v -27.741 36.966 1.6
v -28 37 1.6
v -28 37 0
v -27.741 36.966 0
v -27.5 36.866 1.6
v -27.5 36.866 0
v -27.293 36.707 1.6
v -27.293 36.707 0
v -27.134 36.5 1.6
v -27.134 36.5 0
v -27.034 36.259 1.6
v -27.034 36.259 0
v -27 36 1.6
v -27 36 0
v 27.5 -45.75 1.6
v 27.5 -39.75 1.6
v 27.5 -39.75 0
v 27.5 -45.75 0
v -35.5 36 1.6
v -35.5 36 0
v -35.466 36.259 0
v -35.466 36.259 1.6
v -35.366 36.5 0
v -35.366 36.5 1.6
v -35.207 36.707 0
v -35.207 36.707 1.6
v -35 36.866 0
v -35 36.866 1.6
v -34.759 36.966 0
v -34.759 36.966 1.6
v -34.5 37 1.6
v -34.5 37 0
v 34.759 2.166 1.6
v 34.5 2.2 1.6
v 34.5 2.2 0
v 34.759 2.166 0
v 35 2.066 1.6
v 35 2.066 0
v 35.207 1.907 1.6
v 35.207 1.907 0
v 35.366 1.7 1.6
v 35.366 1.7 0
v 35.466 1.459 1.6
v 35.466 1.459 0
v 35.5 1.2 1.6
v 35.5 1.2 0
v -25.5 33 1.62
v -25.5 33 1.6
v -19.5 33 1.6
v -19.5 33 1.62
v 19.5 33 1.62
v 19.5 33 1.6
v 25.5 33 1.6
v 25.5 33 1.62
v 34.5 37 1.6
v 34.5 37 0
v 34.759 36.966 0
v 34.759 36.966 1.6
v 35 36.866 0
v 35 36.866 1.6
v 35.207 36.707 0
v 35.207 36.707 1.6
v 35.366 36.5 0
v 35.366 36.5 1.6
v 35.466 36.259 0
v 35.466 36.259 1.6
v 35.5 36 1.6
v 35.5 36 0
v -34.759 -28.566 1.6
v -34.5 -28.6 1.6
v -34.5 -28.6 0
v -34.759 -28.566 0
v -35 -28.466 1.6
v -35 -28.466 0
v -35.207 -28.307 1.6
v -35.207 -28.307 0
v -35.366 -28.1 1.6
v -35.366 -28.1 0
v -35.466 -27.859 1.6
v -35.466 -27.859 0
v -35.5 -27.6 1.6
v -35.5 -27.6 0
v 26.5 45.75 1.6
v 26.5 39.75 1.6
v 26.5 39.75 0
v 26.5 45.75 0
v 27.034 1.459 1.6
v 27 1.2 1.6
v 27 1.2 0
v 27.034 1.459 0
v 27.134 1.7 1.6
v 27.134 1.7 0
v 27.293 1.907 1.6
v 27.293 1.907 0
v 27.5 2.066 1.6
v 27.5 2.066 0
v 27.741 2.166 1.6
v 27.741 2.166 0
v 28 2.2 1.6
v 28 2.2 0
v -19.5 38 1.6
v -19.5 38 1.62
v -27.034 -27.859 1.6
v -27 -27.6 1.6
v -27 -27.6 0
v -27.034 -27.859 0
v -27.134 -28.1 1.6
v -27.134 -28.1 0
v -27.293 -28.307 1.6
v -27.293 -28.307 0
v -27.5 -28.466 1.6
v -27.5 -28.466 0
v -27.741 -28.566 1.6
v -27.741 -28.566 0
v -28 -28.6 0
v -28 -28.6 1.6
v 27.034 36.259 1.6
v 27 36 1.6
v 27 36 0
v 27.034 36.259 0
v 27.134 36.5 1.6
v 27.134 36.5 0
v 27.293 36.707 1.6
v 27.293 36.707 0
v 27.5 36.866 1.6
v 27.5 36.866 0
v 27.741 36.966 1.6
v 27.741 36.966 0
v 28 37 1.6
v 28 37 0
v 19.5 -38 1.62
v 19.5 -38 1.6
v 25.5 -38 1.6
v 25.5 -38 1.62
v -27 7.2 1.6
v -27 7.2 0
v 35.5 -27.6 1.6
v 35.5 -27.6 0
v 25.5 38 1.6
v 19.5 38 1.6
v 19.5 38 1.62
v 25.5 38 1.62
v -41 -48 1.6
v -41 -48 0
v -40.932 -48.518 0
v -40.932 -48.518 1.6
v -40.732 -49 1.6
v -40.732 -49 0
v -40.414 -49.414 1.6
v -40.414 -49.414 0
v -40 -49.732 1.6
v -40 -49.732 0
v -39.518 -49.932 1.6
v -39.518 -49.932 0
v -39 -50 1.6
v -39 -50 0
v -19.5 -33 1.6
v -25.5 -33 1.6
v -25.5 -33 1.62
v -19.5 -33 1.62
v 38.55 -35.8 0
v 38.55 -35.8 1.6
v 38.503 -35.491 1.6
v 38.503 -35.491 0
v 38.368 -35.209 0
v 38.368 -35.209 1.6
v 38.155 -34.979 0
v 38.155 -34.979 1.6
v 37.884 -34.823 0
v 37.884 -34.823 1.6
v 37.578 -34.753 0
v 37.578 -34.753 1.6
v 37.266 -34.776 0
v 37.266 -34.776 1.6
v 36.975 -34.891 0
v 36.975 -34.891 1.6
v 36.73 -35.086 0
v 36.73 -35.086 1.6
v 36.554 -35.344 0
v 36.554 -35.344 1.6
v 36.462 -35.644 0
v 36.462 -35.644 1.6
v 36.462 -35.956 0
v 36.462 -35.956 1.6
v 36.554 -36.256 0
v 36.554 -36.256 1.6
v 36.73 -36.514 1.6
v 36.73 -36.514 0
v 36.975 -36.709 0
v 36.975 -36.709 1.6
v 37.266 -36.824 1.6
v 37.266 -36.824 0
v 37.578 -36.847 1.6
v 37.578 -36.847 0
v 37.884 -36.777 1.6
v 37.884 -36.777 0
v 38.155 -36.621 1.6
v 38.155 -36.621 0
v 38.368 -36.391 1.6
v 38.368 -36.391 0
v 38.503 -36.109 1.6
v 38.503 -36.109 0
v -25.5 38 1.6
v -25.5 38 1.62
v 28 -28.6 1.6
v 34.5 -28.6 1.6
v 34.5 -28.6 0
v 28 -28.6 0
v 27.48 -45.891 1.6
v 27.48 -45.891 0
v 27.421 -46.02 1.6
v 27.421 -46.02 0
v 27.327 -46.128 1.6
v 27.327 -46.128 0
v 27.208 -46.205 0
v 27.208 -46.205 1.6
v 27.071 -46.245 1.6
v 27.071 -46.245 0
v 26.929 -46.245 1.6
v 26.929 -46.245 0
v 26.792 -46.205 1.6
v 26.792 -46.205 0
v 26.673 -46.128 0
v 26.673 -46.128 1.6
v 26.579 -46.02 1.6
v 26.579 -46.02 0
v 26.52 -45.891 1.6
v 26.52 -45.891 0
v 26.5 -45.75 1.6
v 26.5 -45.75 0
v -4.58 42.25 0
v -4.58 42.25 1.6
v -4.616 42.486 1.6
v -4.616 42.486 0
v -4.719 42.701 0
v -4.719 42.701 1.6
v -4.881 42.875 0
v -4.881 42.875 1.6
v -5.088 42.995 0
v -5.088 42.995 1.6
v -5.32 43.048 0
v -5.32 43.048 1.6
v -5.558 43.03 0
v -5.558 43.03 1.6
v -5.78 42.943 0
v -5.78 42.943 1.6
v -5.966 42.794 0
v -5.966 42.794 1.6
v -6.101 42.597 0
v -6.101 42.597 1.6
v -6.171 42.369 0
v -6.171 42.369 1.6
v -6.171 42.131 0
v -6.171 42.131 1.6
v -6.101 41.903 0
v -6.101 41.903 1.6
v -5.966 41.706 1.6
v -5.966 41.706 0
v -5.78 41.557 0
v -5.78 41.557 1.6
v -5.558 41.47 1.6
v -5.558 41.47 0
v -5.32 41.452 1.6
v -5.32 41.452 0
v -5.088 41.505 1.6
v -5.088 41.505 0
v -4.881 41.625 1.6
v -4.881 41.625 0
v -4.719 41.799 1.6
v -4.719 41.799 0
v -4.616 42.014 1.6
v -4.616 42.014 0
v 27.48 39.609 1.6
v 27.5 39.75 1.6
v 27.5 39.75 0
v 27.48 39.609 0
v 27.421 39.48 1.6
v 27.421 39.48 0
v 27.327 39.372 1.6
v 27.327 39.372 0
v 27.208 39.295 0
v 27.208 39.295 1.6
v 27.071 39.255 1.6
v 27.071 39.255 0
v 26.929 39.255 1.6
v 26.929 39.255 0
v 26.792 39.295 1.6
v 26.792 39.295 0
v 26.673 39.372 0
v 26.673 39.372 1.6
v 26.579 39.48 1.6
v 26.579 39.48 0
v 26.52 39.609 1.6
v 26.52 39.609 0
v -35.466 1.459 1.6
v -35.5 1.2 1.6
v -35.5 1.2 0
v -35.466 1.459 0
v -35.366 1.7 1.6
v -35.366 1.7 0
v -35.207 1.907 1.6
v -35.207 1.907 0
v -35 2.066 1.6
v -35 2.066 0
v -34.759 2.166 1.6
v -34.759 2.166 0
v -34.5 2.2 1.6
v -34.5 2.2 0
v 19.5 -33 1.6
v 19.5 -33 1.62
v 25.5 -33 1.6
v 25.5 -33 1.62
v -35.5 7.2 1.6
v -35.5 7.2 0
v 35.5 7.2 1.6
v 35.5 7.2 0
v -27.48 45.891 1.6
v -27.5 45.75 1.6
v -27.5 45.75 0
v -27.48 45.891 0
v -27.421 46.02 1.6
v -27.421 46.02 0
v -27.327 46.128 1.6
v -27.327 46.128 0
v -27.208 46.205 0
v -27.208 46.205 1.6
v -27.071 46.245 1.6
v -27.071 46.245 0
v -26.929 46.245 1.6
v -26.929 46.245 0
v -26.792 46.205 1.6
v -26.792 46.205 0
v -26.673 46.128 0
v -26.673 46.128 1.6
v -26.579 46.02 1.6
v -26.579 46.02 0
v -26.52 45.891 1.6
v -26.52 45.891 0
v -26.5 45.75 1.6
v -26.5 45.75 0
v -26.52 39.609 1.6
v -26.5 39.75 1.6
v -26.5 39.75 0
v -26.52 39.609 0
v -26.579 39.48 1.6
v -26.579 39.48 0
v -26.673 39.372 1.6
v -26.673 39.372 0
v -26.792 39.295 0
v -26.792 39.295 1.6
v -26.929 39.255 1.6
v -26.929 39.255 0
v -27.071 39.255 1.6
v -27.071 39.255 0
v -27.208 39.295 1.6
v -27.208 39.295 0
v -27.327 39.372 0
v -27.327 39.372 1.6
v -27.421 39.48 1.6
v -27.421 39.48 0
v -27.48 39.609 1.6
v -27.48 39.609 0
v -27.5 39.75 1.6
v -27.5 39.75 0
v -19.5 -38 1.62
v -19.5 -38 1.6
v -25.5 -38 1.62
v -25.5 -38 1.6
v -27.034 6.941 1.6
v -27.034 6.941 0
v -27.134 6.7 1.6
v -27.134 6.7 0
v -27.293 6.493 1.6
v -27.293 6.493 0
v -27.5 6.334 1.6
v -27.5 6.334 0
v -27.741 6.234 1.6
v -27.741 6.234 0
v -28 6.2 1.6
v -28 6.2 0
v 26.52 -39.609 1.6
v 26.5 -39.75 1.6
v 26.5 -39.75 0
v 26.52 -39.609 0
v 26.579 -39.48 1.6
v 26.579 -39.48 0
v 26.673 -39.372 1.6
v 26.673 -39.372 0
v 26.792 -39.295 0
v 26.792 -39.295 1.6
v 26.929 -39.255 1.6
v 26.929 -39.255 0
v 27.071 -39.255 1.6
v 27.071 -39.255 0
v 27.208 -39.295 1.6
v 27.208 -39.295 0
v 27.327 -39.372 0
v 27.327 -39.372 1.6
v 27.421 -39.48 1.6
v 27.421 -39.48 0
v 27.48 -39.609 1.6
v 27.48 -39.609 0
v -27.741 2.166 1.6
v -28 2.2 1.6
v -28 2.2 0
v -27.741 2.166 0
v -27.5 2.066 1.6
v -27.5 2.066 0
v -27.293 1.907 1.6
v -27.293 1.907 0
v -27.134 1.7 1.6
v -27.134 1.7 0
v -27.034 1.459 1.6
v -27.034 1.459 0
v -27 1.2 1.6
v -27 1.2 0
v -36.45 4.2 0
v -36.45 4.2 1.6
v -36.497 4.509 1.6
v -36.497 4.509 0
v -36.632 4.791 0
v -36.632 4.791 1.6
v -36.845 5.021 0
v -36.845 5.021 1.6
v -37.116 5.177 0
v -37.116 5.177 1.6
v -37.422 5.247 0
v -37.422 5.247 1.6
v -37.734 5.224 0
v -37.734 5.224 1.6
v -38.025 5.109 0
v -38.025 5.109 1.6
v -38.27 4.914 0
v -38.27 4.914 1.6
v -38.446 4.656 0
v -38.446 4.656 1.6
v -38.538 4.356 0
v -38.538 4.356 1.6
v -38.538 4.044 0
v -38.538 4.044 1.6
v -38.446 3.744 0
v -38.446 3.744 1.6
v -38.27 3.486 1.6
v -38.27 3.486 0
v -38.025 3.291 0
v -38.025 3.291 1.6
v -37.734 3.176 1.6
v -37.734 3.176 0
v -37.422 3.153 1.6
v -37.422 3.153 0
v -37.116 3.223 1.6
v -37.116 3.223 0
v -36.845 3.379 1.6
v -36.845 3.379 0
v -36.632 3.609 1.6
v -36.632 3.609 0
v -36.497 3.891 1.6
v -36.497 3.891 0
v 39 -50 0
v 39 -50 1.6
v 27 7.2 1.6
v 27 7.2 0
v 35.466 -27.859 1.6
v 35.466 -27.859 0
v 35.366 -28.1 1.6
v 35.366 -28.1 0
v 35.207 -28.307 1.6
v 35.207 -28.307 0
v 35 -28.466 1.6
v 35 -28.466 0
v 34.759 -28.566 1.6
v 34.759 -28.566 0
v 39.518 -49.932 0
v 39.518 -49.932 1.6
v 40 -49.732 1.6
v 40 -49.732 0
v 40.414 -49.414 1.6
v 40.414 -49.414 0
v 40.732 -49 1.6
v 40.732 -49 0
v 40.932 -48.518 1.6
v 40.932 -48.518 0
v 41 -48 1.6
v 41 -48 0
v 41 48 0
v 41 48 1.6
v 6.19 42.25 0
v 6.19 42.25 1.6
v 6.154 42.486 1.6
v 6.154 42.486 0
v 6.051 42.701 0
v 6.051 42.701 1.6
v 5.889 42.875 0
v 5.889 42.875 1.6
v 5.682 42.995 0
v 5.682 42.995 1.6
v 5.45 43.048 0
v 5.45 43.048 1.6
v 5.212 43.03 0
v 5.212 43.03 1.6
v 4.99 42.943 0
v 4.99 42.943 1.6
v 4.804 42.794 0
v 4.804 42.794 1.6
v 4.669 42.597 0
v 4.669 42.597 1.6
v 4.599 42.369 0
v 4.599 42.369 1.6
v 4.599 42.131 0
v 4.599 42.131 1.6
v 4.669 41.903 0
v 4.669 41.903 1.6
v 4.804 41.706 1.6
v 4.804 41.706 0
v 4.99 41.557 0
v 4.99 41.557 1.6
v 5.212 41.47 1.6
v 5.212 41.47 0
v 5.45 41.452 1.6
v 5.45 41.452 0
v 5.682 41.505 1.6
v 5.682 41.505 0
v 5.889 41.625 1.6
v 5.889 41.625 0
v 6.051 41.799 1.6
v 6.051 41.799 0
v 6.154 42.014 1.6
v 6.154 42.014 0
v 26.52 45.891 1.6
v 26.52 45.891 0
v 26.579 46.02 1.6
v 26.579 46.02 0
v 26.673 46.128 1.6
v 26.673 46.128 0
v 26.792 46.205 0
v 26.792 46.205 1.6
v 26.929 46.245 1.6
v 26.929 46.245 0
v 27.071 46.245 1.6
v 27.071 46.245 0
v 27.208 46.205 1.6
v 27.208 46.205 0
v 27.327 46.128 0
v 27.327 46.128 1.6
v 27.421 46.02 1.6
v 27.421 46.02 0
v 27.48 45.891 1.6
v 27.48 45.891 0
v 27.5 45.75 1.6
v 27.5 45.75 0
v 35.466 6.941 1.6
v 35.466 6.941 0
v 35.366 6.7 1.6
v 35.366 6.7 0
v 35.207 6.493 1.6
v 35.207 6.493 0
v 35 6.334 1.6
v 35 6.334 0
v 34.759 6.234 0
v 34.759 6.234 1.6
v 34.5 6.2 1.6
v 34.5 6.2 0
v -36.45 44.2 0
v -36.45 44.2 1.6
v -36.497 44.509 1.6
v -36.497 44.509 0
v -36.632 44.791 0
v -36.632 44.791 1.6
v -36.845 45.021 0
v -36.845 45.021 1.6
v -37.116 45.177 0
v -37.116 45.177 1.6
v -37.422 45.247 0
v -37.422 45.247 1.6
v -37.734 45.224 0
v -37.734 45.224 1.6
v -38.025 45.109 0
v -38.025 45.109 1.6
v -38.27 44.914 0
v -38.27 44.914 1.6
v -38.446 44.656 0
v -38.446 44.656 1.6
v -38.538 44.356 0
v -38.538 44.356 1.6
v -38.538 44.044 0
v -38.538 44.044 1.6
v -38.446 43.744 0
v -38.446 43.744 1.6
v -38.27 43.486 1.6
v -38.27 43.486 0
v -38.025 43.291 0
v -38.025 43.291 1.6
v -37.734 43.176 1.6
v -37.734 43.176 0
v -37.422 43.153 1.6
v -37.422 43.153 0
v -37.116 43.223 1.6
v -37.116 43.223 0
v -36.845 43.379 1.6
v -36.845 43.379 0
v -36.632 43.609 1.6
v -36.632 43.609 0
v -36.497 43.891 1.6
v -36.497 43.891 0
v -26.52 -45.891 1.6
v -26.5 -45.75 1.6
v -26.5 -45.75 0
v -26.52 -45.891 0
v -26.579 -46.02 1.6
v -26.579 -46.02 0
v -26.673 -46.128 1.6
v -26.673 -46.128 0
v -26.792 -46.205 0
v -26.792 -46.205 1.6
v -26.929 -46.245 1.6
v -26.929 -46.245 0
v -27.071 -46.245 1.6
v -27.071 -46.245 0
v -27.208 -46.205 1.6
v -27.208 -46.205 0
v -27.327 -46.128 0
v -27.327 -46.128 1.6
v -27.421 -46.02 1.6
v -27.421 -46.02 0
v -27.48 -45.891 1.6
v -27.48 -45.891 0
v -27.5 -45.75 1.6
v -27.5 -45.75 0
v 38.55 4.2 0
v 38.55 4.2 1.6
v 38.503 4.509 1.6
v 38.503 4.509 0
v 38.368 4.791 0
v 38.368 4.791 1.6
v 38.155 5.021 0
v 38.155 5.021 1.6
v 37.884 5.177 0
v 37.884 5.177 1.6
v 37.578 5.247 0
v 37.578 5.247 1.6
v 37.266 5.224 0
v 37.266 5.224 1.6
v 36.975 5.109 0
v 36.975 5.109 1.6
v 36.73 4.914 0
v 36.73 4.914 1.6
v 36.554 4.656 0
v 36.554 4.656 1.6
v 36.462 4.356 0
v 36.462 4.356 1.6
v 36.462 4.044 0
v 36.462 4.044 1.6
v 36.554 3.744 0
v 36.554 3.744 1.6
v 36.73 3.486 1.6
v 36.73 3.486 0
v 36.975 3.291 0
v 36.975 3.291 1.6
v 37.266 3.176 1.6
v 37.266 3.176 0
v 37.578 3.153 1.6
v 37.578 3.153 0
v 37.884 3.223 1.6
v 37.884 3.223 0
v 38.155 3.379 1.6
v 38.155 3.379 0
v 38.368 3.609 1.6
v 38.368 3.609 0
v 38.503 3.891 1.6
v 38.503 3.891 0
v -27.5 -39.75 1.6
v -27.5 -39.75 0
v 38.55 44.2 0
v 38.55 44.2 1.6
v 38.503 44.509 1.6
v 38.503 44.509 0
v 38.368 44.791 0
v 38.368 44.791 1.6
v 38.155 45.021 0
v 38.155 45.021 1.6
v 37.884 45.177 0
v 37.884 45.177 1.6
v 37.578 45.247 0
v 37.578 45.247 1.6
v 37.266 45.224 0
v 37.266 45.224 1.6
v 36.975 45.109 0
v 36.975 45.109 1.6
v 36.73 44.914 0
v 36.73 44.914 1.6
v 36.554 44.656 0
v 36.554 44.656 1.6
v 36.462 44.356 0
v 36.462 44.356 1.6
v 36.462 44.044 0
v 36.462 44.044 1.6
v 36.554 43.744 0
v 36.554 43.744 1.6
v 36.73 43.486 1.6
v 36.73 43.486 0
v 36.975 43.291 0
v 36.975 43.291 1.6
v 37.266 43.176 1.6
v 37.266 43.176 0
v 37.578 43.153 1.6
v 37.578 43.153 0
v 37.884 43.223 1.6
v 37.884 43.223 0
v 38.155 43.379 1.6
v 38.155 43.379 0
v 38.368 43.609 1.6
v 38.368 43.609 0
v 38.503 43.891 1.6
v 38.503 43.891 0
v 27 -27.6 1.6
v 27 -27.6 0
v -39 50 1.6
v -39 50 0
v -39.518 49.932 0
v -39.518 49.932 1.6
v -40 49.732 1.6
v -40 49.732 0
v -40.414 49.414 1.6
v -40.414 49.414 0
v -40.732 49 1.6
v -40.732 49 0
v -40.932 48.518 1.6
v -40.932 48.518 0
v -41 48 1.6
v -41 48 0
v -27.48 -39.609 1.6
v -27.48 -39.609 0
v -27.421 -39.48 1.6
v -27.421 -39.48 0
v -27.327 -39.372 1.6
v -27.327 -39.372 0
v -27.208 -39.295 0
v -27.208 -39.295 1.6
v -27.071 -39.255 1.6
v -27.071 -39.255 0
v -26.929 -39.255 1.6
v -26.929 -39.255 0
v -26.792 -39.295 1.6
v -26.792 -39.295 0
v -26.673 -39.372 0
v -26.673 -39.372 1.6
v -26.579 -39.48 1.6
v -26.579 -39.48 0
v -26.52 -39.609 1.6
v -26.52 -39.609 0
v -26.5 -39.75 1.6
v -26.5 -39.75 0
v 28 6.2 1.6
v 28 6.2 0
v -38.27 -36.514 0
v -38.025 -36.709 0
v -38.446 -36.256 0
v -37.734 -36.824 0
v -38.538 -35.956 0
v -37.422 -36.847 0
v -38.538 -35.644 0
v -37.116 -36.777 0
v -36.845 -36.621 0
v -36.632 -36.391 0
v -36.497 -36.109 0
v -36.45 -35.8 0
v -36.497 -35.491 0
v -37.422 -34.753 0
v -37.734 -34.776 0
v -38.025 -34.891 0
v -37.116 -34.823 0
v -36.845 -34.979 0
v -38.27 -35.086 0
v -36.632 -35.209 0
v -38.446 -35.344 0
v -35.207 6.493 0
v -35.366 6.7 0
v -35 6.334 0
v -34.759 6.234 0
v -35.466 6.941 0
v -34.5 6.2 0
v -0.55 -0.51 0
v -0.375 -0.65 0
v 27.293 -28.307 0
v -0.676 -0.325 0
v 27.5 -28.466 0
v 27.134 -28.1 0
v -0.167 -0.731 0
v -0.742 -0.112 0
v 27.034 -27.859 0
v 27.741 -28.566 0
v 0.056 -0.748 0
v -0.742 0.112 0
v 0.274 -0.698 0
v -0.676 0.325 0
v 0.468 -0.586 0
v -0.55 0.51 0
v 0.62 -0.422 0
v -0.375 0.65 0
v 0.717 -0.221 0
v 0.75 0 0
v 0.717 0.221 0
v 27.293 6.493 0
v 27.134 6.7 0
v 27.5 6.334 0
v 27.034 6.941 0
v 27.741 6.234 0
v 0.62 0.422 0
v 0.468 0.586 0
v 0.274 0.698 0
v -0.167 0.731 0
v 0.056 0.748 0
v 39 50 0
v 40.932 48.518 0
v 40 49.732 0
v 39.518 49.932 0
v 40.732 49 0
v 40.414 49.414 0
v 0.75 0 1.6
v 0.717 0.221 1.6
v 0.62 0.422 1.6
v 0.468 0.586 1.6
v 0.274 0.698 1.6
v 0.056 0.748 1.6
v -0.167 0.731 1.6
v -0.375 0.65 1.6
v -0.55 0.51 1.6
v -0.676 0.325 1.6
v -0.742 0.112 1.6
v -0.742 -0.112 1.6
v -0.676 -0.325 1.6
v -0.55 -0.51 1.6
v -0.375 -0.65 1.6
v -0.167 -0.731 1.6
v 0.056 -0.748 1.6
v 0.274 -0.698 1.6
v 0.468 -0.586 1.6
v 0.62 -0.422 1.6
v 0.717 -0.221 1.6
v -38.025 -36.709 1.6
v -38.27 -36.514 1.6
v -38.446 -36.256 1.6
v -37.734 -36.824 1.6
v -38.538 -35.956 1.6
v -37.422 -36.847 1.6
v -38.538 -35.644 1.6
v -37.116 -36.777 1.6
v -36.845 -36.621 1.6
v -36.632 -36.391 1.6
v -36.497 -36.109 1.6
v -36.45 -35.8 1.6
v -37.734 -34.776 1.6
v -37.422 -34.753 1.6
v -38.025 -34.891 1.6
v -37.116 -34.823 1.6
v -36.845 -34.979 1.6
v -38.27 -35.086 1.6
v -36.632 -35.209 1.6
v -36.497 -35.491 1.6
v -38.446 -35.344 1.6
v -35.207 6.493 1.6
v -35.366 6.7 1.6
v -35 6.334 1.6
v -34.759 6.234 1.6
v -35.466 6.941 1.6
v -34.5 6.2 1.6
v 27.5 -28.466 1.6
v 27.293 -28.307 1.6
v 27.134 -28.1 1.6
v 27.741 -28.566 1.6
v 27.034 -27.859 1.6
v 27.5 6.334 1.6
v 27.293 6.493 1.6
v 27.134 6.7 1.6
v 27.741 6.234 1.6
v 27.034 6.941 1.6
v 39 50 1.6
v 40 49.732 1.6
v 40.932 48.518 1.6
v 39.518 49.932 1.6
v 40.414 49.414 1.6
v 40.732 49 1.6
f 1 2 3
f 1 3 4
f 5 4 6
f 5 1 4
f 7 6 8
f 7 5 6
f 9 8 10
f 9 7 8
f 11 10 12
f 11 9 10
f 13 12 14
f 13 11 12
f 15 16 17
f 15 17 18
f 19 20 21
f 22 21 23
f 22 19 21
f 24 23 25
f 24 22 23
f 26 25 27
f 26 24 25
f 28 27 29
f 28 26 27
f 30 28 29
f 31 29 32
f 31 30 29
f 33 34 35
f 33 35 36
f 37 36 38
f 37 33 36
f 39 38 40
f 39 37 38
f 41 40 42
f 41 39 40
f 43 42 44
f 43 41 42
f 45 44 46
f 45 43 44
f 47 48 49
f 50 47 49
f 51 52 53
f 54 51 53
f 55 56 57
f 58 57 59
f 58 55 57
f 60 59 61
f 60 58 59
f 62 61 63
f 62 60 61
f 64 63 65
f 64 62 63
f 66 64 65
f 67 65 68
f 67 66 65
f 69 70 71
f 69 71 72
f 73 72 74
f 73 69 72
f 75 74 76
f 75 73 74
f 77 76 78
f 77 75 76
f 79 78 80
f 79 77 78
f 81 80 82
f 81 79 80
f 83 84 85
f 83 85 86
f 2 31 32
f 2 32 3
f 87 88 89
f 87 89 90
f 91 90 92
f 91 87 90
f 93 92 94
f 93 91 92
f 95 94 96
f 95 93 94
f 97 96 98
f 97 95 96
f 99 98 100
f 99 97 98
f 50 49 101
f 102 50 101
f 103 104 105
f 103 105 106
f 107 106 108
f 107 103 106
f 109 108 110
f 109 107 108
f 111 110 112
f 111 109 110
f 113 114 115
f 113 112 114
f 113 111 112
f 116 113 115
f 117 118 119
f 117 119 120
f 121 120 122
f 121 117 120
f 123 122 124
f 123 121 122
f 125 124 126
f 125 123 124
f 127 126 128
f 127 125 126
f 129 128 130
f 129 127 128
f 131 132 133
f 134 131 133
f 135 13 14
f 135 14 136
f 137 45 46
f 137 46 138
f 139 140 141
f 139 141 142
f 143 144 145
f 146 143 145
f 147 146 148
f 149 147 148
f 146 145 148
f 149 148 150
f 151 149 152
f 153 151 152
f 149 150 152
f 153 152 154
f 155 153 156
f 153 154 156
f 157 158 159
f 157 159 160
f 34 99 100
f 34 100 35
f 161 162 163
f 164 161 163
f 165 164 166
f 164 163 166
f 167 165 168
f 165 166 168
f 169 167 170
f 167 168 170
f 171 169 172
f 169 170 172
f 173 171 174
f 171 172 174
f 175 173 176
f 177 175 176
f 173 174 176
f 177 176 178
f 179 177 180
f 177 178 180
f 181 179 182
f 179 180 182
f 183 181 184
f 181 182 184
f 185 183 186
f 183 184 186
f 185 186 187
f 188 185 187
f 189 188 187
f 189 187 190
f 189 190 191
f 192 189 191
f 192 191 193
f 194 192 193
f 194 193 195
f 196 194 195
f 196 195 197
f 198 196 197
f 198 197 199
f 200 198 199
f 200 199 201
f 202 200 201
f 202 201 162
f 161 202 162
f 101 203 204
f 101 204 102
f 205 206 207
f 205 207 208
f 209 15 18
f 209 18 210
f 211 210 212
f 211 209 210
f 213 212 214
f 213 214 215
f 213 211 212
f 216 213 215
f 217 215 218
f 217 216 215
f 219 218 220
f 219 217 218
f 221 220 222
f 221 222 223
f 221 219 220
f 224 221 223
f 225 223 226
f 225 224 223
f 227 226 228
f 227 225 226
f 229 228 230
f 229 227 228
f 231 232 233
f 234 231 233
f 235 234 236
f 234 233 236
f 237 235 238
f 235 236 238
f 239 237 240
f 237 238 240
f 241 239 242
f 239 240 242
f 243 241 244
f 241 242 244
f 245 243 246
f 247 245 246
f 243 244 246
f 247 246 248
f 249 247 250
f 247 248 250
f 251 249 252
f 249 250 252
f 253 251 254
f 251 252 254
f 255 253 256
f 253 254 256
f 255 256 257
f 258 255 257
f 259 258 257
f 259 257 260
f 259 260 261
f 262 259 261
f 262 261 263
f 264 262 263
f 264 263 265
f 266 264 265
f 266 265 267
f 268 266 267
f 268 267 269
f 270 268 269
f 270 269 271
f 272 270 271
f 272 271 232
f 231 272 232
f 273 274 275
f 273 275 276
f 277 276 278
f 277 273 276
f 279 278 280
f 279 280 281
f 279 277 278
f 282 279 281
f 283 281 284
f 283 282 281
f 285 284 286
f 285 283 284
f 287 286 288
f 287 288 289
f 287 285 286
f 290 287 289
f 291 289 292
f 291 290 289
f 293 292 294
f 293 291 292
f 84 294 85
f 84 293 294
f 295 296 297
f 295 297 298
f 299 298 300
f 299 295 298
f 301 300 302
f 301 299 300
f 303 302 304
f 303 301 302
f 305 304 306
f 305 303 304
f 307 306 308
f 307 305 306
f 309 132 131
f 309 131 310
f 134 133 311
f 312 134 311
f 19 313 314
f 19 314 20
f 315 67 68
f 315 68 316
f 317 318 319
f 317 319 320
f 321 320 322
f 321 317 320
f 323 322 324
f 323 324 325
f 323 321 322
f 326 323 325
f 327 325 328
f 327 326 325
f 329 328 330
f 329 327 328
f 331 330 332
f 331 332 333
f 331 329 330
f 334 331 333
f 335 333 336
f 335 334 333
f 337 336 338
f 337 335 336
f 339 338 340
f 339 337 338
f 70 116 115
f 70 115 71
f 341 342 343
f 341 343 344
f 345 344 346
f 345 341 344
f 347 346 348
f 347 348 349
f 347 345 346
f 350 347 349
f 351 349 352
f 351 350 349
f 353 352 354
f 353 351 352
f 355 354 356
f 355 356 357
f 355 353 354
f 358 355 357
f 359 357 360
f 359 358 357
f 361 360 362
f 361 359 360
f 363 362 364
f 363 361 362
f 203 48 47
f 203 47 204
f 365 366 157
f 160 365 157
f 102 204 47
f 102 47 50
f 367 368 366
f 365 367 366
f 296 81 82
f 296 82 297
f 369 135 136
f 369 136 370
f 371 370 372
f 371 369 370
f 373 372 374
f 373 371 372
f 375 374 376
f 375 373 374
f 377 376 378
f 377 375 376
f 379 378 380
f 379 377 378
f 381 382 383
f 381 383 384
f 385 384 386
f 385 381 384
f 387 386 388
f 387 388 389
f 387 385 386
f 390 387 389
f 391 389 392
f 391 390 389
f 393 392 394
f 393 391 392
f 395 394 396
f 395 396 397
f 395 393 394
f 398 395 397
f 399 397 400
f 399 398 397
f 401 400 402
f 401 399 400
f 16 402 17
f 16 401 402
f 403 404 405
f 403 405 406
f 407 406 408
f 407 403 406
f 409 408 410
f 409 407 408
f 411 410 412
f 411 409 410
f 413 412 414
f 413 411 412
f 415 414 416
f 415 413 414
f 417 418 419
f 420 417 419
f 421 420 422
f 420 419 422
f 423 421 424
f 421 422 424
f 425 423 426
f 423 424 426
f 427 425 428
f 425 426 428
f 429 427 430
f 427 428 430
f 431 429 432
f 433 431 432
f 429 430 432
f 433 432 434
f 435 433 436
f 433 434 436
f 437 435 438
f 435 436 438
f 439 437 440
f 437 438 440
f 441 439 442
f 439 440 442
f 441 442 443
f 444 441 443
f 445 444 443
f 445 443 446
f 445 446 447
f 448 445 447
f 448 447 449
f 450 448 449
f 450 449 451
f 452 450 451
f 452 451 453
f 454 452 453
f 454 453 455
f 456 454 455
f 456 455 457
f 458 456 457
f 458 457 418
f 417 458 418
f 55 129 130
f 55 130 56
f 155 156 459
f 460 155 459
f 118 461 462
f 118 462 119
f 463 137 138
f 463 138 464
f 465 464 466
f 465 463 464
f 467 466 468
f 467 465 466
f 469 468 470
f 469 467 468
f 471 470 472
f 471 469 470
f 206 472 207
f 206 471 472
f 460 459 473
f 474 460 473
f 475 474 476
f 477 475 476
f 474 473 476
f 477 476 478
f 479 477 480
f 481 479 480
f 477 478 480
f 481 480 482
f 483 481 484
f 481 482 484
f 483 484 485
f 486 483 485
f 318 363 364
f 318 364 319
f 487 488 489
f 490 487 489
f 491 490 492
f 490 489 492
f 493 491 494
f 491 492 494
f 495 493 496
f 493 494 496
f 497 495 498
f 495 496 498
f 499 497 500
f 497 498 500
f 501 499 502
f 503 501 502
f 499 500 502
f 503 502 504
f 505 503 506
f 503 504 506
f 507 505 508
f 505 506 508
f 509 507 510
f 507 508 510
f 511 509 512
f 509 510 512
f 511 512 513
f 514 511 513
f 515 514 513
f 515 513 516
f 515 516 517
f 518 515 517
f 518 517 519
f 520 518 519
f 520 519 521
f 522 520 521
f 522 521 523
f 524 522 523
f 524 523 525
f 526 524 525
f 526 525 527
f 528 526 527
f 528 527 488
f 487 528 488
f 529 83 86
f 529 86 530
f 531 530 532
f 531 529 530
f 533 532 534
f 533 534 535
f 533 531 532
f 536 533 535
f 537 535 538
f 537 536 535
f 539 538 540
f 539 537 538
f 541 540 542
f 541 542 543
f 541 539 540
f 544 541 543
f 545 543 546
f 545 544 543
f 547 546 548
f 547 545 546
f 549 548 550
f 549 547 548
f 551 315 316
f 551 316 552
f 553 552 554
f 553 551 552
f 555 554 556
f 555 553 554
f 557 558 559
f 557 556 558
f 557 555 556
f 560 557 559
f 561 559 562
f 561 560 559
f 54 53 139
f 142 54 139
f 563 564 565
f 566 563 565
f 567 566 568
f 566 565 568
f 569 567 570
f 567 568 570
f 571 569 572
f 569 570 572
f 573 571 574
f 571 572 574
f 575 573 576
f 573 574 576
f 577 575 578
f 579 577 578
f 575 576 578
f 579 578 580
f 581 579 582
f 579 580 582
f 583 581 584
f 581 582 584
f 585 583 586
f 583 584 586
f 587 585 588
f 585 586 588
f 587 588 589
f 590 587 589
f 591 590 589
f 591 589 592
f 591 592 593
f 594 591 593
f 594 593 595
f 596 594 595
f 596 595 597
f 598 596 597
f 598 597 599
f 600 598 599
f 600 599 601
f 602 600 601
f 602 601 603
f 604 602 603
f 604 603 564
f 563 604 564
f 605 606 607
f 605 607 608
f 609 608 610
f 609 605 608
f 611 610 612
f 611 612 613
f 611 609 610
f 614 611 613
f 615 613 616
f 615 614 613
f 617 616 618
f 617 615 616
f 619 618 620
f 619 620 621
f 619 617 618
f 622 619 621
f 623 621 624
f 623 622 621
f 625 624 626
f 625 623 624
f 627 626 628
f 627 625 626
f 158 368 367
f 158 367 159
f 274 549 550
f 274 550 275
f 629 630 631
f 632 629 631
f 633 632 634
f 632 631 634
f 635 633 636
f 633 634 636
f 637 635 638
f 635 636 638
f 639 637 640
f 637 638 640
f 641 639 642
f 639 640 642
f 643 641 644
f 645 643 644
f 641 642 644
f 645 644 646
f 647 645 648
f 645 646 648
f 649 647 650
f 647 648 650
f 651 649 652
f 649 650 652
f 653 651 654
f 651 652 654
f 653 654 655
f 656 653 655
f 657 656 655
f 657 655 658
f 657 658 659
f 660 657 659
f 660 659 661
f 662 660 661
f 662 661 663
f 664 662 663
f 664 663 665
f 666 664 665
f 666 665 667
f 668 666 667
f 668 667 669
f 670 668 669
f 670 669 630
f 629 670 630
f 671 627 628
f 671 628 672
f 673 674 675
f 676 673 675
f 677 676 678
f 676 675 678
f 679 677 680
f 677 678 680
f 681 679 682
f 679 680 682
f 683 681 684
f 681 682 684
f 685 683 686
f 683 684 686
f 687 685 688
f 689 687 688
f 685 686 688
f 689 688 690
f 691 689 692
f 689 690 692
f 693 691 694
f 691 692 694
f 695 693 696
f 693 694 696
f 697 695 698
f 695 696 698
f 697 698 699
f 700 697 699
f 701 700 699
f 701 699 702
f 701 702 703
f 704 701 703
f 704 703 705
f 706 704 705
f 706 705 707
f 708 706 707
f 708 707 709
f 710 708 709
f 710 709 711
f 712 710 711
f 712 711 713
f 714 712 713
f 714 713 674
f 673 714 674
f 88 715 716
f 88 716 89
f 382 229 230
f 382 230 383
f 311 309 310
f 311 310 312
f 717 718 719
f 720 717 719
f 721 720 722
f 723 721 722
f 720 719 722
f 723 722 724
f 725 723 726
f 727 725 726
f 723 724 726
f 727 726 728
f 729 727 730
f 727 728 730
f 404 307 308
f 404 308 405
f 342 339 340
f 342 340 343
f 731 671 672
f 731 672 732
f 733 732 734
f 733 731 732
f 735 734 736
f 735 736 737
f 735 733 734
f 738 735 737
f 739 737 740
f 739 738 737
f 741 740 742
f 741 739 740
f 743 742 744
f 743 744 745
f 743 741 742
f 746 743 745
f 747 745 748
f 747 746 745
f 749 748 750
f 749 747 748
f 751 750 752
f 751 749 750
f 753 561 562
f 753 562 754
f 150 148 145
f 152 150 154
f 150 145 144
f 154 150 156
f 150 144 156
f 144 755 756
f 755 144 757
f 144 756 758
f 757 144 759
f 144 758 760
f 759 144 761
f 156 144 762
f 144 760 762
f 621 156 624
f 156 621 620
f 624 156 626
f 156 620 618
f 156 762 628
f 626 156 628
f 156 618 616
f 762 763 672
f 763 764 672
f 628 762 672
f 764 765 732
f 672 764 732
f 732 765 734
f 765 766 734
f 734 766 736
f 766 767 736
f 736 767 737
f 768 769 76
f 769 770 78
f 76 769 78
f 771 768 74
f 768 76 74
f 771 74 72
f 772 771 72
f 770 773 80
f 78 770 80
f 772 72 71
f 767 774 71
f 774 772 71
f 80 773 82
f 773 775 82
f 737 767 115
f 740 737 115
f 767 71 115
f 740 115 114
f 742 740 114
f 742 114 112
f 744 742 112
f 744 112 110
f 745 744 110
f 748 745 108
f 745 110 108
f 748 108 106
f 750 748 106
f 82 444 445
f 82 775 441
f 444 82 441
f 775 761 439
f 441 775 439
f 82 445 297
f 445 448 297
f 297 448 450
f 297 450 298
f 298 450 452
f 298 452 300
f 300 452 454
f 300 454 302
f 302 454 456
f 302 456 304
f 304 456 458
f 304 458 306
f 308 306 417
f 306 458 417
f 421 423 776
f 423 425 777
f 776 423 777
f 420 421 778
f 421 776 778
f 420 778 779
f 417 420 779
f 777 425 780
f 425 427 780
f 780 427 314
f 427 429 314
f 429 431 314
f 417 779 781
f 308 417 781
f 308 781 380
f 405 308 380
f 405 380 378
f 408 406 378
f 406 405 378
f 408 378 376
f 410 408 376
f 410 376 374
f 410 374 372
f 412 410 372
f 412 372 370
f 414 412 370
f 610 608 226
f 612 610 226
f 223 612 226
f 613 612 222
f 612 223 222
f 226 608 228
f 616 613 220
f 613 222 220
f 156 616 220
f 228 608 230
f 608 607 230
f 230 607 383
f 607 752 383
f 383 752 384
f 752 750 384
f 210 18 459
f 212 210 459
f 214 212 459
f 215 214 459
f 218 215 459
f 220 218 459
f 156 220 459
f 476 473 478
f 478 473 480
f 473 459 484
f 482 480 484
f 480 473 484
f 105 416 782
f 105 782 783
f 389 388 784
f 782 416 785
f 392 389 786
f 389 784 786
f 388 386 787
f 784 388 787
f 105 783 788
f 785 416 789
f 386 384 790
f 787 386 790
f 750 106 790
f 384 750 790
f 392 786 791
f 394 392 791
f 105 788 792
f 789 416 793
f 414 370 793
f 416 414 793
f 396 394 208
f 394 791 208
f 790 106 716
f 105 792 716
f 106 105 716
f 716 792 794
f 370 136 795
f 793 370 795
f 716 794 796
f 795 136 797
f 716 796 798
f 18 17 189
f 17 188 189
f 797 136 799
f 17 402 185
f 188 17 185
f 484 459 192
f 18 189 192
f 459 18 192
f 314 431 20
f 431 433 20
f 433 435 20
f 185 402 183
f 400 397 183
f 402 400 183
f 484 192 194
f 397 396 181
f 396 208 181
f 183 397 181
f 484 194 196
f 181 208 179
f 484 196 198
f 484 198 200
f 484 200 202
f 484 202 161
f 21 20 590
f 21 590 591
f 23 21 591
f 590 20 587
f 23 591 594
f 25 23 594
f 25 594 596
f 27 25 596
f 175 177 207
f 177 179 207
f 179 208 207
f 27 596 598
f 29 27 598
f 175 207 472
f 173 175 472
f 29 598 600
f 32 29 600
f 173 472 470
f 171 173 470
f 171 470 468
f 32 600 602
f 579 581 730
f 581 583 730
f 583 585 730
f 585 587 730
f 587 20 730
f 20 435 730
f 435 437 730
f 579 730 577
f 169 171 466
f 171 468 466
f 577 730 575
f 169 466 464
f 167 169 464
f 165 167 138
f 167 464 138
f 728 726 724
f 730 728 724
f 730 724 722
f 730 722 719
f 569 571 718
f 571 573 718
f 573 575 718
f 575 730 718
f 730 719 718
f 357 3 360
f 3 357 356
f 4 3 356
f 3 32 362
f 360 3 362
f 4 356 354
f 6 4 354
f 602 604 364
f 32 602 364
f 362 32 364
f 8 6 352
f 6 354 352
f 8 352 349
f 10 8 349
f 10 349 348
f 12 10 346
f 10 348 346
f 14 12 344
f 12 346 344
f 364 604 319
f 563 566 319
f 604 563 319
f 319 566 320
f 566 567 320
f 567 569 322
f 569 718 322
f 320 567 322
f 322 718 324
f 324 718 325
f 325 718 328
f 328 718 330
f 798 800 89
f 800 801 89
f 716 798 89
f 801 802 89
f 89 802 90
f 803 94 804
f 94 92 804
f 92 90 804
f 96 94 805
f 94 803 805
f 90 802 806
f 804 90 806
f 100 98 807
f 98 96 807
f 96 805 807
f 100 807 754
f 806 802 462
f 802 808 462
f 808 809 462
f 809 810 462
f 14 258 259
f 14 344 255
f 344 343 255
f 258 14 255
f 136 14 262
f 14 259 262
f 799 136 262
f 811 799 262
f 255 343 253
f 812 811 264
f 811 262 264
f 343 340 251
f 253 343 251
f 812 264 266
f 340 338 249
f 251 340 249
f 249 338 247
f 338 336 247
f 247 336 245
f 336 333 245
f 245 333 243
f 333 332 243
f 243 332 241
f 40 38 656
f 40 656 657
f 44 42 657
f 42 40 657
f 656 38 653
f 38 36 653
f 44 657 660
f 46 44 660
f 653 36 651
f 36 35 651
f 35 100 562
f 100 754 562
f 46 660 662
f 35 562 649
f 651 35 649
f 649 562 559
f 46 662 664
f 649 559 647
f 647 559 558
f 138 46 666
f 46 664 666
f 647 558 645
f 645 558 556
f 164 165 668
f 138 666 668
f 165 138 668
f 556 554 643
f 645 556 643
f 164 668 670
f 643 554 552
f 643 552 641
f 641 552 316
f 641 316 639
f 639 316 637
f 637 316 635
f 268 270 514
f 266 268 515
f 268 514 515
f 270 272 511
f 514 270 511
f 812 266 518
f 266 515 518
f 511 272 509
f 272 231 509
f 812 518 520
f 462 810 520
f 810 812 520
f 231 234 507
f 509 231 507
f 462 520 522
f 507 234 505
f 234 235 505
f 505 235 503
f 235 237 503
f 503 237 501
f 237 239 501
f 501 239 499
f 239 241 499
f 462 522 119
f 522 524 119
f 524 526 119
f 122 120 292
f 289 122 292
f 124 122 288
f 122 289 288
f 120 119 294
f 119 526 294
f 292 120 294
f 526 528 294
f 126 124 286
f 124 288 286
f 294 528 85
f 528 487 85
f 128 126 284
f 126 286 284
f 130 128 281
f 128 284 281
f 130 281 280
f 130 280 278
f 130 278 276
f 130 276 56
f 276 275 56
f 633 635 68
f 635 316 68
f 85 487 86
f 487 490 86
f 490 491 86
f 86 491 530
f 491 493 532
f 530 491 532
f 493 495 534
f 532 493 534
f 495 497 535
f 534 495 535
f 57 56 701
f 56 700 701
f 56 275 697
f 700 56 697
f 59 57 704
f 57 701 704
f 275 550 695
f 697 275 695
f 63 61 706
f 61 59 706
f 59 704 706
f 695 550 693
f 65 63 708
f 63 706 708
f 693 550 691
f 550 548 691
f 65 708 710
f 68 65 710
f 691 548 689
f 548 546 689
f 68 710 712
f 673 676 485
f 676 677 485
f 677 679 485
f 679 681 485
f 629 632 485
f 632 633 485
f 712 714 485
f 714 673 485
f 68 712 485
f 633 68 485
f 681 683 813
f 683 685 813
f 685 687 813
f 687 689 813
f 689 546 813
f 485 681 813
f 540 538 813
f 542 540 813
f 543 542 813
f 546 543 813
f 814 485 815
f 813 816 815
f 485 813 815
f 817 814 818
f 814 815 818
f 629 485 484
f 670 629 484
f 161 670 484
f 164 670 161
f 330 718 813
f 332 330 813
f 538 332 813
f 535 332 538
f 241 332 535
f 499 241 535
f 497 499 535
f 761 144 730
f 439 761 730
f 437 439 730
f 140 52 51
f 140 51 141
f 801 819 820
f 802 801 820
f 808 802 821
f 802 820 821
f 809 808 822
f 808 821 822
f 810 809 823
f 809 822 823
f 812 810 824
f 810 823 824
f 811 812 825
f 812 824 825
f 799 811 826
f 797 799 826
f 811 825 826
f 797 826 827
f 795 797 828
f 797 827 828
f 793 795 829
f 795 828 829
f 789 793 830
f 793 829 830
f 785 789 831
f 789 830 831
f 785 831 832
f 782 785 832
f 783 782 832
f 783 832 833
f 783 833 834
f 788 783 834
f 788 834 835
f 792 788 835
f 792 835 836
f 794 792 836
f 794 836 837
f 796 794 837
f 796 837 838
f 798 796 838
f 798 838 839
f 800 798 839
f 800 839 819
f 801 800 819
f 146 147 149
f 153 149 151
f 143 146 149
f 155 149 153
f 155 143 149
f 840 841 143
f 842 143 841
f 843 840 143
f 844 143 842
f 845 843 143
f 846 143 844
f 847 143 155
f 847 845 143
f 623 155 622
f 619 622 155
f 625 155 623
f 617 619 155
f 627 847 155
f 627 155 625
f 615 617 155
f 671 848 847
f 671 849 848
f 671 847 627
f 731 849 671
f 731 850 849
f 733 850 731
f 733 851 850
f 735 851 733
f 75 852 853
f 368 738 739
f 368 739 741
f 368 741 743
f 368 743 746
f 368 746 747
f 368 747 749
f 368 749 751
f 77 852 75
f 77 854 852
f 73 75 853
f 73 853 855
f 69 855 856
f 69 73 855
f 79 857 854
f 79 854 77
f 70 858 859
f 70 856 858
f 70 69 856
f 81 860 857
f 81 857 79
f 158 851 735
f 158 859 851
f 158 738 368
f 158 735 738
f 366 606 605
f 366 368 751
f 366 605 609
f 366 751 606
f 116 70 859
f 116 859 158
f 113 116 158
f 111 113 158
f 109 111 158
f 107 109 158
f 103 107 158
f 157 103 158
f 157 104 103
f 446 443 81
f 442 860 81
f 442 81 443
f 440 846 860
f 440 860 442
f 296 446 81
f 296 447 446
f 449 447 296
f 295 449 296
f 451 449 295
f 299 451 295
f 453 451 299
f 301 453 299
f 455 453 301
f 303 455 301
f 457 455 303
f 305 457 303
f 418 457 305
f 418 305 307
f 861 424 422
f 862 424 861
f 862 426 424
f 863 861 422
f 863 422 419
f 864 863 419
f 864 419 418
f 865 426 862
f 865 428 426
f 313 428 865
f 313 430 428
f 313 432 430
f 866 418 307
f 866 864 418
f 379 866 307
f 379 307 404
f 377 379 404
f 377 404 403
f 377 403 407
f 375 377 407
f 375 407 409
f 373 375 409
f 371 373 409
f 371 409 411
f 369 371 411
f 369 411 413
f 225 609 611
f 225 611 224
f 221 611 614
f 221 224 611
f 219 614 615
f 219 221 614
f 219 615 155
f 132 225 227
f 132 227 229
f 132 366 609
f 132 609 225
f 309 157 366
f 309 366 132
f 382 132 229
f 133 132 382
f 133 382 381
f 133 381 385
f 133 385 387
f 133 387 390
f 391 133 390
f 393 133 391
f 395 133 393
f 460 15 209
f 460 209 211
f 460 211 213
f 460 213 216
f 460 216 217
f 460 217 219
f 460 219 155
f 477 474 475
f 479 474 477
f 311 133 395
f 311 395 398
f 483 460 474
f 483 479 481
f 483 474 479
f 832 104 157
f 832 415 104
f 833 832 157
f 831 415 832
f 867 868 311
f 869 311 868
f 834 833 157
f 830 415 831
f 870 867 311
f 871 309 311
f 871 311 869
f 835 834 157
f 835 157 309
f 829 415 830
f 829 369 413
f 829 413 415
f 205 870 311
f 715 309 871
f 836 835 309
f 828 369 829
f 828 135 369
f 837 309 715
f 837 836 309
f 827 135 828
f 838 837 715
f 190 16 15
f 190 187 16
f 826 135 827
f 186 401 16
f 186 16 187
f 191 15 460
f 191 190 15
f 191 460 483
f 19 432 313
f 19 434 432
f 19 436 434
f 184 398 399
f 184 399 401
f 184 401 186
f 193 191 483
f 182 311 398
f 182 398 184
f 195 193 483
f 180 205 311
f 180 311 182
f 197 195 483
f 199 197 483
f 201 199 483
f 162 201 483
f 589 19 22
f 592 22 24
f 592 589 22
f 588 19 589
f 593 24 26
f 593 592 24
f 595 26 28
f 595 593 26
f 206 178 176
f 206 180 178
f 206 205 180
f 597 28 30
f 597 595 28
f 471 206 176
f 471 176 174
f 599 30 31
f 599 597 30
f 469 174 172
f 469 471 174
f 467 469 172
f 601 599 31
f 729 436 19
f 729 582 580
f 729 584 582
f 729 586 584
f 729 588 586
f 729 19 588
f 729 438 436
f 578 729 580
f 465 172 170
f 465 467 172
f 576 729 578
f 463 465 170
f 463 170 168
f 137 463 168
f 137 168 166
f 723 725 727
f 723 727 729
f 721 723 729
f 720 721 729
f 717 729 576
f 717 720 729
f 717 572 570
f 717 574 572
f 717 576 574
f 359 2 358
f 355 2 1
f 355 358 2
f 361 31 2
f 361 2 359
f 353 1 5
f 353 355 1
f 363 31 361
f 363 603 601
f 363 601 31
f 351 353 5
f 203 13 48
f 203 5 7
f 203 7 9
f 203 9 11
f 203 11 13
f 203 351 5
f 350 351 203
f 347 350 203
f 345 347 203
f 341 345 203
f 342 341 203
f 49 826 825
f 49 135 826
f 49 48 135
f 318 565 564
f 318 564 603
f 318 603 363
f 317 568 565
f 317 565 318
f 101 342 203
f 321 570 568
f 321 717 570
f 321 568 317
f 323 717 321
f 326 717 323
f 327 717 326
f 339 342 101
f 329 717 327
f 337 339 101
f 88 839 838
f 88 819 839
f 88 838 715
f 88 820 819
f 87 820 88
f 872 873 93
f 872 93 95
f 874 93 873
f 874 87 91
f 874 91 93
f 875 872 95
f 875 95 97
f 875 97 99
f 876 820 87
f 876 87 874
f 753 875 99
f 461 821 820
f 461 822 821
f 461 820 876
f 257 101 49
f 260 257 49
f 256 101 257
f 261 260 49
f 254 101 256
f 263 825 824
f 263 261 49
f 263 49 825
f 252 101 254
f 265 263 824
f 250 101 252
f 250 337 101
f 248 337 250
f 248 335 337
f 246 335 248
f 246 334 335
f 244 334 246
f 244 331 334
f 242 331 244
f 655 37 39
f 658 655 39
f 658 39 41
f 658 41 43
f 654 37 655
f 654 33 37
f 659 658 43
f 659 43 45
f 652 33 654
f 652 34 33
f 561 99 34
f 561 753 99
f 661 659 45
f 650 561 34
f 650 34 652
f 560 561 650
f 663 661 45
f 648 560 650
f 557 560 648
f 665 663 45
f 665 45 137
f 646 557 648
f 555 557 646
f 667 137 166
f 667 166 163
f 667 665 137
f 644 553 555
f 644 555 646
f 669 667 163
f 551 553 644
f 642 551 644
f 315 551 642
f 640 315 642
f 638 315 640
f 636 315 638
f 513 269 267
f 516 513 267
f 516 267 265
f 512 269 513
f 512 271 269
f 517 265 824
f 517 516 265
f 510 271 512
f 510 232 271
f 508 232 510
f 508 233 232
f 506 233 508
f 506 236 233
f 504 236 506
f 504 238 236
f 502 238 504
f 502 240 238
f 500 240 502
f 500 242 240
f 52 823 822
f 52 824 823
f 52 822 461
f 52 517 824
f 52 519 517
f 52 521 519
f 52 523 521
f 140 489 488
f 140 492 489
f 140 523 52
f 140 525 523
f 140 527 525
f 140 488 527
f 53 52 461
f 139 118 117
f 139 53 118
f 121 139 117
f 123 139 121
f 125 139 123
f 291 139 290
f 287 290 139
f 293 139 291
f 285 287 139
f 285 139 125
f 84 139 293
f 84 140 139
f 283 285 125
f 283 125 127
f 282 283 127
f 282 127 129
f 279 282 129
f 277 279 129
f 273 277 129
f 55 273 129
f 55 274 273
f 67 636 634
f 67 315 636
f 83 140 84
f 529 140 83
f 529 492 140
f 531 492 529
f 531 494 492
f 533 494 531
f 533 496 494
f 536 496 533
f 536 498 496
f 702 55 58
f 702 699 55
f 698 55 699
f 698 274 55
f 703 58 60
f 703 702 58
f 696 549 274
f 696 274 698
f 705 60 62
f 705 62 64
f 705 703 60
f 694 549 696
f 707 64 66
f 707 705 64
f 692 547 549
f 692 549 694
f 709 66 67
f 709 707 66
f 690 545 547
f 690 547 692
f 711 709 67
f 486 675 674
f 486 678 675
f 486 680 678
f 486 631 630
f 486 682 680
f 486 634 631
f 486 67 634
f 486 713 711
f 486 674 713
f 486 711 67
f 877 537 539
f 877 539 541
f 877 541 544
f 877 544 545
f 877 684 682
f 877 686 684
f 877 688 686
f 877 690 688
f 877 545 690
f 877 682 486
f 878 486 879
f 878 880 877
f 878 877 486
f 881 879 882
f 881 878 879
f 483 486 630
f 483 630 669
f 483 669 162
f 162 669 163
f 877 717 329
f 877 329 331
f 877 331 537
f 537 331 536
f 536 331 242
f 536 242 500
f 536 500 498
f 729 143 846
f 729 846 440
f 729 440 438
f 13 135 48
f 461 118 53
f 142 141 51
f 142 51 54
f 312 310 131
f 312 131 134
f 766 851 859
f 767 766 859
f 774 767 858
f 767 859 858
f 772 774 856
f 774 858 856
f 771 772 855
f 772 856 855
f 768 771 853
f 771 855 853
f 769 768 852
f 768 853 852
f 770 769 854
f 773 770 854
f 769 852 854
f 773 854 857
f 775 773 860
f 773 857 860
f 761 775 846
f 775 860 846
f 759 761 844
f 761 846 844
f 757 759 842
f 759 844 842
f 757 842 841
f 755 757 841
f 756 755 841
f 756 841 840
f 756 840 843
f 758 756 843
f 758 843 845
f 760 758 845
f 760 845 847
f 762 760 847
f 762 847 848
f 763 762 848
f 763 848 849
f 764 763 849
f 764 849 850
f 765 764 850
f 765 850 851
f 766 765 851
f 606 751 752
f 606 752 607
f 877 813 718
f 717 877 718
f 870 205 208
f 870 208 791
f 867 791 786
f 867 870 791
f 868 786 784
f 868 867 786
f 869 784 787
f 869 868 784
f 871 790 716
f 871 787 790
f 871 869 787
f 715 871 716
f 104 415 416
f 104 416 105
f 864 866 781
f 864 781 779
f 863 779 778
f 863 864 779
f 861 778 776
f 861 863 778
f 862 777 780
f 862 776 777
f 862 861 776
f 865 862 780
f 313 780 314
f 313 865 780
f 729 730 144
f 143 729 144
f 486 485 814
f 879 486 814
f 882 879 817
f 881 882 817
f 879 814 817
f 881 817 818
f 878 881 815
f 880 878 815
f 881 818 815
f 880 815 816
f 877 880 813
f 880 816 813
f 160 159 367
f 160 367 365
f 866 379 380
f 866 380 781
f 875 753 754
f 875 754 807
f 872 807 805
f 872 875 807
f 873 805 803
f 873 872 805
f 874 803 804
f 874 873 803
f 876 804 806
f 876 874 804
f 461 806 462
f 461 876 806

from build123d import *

# Parameters (mm, degrees)
BOSS_EXTRUDE1_DEPTH = 1.6
SKETCH2_R           = 0.75
SKETCH2_R_2         = 1.05
SKETCH2_R_3         = 0.8
CUT_EXTRUDE1_DEPTH  = 65.680445267
CUT_EXTRUDE2_DEPTH  = 65.680445267
CUT_EXTRUDE3_DEPTH  = 1.6
SKETCH5_W           = 6
SKETCH5_H           = 5
BOSS_EXTRUDE2_DEPTH = 0.02


with BuildPart() as part:
    # Sketch1 → Boss-Extrude1 (new body)
    with BuildSketch(Plane.XY):
        with BuildLine():
            Line((-39, -50), (39, -50))
            ThreePointArc((39, -50), (40.414213562, -49.414213562), (41, -48))
            Line((41, -48), (41, 48))
            ThreePointArc((41, 48), (40.414213562, 49.414213562), (39, 50))
            Line((39, 50), (-39, 50))
            ThreePointArc((-39, 50), (-40.414213562, 49.414213562), (-41, 48))
            Line((-41, 48), (-41, -48))
            ThreePointArc((-41, -48), (-40.414213562, -49.414213562), (-39, -50))
        make_face()
    extrude(amount=BOSS_EXTRUDE1_DEPTH)

    # Sketch2 → Cut-Extrude1 (cut, through all)
    with BuildSketch(Plane.XY.offset(1.6)):
        Circle(SKETCH2_R)
        with Locations((-37.5, 44.2)):
            Circle(SKETCH2_R_2)
        with Locations((37.5, 44.2)):
            Circle(SKETCH2_R_2)
        with Locations((37.5, 4.2)):
            Circle(SKETCH2_R_2)
        with Locations((37.5, -35.8)):
            Circle(SKETCH2_R_2)
        with Locations((-37.5, 4.2)):
            Circle(SKETCH2_R_2)
        with Locations((-37.5, -35.8)):
            Circle(SKETCH2_R_2)
        with Locations((-5.38, 42.25)):
            Circle(SKETCH2_R_3)
        with Locations((5.39, 42.25)):
            Circle(SKETCH2_R_3)
    extrude(amount=-CUT_EXTRUDE1_DEPTH, mode=Mode.SUBTRACT)

    # Sketch3 → Cut-Extrude2 (cut, through all)
    with BuildSketch(Plane.XY.offset(1.6)):
        with BuildLine():
            Line((-34.5, 37), (-28, 37))
            ThreePointArc((-28, 37), (-27.292893219, 36.707106781), (-27, 36))
            Line((-27, 36), (-27, 7.2))
            ThreePointArc((-27, 7.2), (-27.292893219, 6.492893219), (-28, 6.2))
            Line((-28, 6.2), (-34.5, 6.2))
            ThreePointArc((-34.5, 6.2), (-35.207106781, 6.492893219), (-35.5, 7.2))
            Line((-35.5, 7.2), (-35.5, 36))
            ThreePointArc((-35.5, 36), (-35.207106781, 36.707106781), (-34.5, 37))
        make_face()
        with BuildLine():
            Line((28, 37), (34.5, 37))
            ThreePointArc((34.5, 37), (35.207106781, 36.707106781), (35.5, 36))
            Line((35.5, 36), (35.5, 7.2))
            ThreePointArc((35.5, 7.2), (35.207106781, 6.492893219), (34.5, 6.2))
            Line((34.5, 6.2), (28, 6.2))
            ThreePointArc((28, 6.2), (27.292893219, 6.492893219), (27, 7.2))
            Line((27, 7.2), (27, 36))
            ThreePointArc((27, 36), (27.292893219, 36.707106781), (28, 37))
        make_face()
        with BuildLine():
            Line((28, 2.2), (34.5, 2.2))
            ThreePointArc((34.5, 2.2), (35.207106781, 1.907106781), (35.5, 1.2))
            Line((35.5, 1.2), (35.5, -27.6))
            ThreePointArc((35.5, -27.6), (35.207106781, -28.307106781), (34.5, -28.6))
            Line((34.5, -28.6), (28, -28.6))
            ThreePointArc((28, -28.6), (27.292893219, -28.307106781), (27, -27.6))
            Line((27, -27.6), (27, 1.2))
            ThreePointArc((27, 1.2), (27.292893219, 1.907106781), (28, 2.2))
        make_face()
        with BuildLine():
            Line((-34.5, 2.2), (-28, 2.2))
            ThreePointArc((-28, 2.2), (-27.292893219, 1.907106781), (-27, 1.2))
            Line((-27, 1.2), (-27, -27.6))
            ThreePointArc((-27, -27.6), (-27.292893219, -28.307106781), (-28, -28.6))
            Line((-28, -28.6), (-34.5, -28.6))
            ThreePointArc((-34.5, -28.6), (-35.207106781, -28.307106781), (-35.5, -27.6))
            Line((-35.5, -27.6), (-35.5, 1.2))
            ThreePointArc((-35.5, 1.2), (-35.207106781, 1.907106781), (-34.5, 2.2))
        make_face()
    extrude(amount=-CUT_EXTRUDE2_DEPTH, mode=Mode.SUBTRACT)

    # Sketch4 → Cut-Extrude3 (cut)
    with BuildSketch(Plane.XY.offset(1.6)):
        with BuildLine():
            Line((-27.5, 39.75), (-27.5, 45.75))
            ThreePointArc((-27.5, 45.75), (-27, 46.25), (-26.5, 45.75))
            Line((-26.5, 45.75), (-26.5, 39.75))
            ThreePointArc((-26.5, 39.75), (-27, 39.25), (-27.5, 39.75))
        make_face()
        with BuildLine():
            Line((26.5, 39.75), (26.5, 45.75))
            ThreePointArc((26.5, 45.75), (27, 46.25), (27.5, 45.75))
            Line((27.5, 45.75), (27.5, 39.75))
            ThreePointArc((27.5, 39.75), (27, 39.25), (26.5, 39.75))
        make_face()
        with BuildLine():
            Line((26.5, -45.75), (26.5, -39.75))
            ThreePointArc((26.5, -39.75), (27, -39.25), (27.5, -39.75))
            Line((27.5, -39.75), (27.5, -45.75))
            ThreePointArc((27.5, -45.75), (27, -46.25), (26.5, -45.75))
        make_face()
        with BuildLine():
            Line((-27.5, -45.75), (-27.5, -39.75))
            ThreePointArc((-27.5, -39.75), (-27, -39.25), (-26.5, -39.75))
            Line((-26.5, -39.75), (-26.5, -45.75))
            ThreePointArc((-26.5, -45.75), (-27, -46.25), (-27.5, -45.75))
        make_face()
    extrude(amount=-CUT_EXTRUDE3_DEPTH, mode=Mode.SUBTRACT)

    # Sketch5 → Boss-Extrude2 (add)
    with BuildSketch(Plane.XY.offset(1.6)):
        with Locations((-22.5, 35.5)):
            Rectangle(SKETCH5_W, SKETCH5_H)
        with Locations((22.5, 35.5)):
            Rectangle(SKETCH5_W, SKETCH5_H)
        with Locations((22.5, -35.5)):
            Rectangle(SKETCH5_W, SKETCH5_H)
        with Locations((-22.5, -35.5)):
            Rectangle(SKETCH5_W, SKETCH5_H)
    extrude(amount=BOSS_EXTRUDE2_DEPTH)


solid = part.part
